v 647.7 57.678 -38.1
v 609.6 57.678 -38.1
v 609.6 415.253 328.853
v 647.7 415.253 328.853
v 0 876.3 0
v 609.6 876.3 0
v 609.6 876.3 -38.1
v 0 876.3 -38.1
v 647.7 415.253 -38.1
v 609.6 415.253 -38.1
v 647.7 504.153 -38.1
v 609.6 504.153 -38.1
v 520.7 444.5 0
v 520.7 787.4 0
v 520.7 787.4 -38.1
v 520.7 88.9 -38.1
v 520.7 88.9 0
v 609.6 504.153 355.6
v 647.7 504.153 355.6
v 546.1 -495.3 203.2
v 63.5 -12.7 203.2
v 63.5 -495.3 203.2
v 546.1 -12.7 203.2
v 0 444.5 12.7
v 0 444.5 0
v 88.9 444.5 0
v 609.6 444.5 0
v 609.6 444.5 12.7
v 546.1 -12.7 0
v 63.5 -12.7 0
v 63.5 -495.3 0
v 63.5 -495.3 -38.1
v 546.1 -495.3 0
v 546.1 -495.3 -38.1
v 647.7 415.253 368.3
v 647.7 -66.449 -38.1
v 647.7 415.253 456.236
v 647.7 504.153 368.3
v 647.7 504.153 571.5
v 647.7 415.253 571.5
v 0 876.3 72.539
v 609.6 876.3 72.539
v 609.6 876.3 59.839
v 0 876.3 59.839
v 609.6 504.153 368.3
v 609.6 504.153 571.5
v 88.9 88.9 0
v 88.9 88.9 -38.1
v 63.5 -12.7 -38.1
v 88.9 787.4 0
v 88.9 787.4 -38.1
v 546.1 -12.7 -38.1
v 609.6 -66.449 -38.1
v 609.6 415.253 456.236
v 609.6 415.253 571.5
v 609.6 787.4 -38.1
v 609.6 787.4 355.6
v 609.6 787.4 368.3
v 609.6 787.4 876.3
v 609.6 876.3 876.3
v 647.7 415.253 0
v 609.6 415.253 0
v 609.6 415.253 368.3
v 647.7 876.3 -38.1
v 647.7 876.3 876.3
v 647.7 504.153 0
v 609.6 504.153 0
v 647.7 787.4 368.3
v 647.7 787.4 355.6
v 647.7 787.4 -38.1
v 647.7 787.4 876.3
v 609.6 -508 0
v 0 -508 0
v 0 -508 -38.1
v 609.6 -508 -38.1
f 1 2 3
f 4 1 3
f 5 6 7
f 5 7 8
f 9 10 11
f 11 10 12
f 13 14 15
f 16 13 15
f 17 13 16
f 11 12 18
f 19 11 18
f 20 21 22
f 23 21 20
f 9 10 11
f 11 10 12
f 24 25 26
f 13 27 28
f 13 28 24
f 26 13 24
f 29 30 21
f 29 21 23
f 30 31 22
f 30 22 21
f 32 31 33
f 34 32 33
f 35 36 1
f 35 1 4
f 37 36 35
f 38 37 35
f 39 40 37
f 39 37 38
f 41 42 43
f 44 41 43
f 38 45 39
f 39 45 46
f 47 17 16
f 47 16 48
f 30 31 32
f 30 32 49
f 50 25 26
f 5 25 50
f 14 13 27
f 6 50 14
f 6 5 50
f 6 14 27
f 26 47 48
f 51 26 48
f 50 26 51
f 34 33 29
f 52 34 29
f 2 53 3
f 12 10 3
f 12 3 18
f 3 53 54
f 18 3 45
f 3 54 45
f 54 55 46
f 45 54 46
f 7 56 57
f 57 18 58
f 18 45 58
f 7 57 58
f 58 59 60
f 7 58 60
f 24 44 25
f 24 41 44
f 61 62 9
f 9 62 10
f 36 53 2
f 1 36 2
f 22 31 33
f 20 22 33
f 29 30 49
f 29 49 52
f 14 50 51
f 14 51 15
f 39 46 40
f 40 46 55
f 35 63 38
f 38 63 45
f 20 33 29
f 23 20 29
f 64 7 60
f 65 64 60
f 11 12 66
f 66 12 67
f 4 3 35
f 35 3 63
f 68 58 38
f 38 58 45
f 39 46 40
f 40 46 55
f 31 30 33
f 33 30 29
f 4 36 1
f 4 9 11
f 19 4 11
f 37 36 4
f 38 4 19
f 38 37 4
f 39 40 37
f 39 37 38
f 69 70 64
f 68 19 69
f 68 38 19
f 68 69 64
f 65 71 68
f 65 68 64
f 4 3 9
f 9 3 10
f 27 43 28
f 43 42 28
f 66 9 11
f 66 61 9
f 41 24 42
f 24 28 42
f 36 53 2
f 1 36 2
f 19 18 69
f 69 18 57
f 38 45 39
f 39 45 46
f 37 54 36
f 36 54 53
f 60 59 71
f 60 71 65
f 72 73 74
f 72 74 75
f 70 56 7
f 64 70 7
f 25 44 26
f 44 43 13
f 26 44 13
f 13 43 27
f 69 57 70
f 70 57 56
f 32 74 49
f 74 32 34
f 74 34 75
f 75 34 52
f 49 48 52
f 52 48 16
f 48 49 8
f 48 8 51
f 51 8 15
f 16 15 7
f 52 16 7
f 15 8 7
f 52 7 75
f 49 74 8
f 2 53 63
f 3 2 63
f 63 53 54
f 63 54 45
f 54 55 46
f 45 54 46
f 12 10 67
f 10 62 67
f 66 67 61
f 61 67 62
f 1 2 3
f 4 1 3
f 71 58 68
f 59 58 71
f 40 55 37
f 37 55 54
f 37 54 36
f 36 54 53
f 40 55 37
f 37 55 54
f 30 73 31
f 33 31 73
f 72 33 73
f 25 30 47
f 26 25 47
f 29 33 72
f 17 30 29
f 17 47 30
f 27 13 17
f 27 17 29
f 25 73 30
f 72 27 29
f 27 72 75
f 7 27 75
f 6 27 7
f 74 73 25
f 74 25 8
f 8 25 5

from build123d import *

# Parameters (mm, degrees)
F0_W      = 431.8
F0_H      = 88.9
F1_DEPTH  = 38.1
F3_DEPTH  = 431.8
F4_DEPTH  = 88.9
F5_DEPTH  = 88.9
F6_W      = 482.6
F6_H      = 482.6
F7_DEPTH  = 203.2
F6_W_2    = 609.6
F6_H_2    = 508
F8_DEPTH  = 38.1
F9_W      = 283.2469639567
F9_H      = 12.7
F9_W_2    = 88.9
F9_H_2    = 355.6
F9_H_3    = 508
F9_H_4    = 38.1
F10_DEPTH = 38.1
F11_DEPTH = 38.1


with BuildPart() as f1:
    # F0 (on Top) → F1 (new body)
    with BuildSketch(Plane.XY):
        Polygon((0, 88.9), (0, 0), (609.6, 0), (609.6, 88.9), (520.7, 88.9), (88.9, 88.9), align=None)
        Polygon((0, 876.3), (0, 88.9), (88.9, 88.9), (88.9, 444.5), (88.9, 787.4), (88.9, 876.3), align=None)
        Polygon((520.7, 88.9), (609.6, 88.9), (609.6, 876.3), (520.7, 876.3), (520.7, 787.4), (520.7, 444.5), align=None)
        with Locations((304.8, 831.85)):
            Rectangle(F0_W, F0_H)
    extrude(amount=-F1_DEPTH)



with BuildPart() as f3:
    # F2 (on face) → F3 (new body)
    with BuildSketch(Plane(origin=(520.7, 0, 0), x_dir=(0, -1, 0), z_dir=(-1, 0, 0))):
        Polygon((-876.3, 59.839021205), (-444.5, 0), (-444.5, 12.7), (-876.3, 72.539021205), align=None)
    extrude(amount=F3_DEPTH)


with BuildPart() as f1_1:
    add(f1.part)
    # F4 (add): a face of the model
    f4_faces = [f3.part.faces().sort_by_distance(p)[0] for p in [
        (520.7, 660.4, 36.2695106025),
    ]]

    add(f3.part)  # F4 merges F3
    extrude(f4_faces, amount=F4_DEPTH)

    # F5 (add): a face of the model
    f5_faces = [f1_1.faces().sort_by_distance(p)[0] for p in [
        (88.9, 660.4, 36.2695106025),
    ]]
    extrude(f5_faces, amount=F5_DEPTH)



with BuildPart() as f7:
    # F6 (on Top) → F7 (new body)
    with BuildSketch(Plane.XY):
        with Locations((304.8, -254)):
            Rectangle(F6_W, F6_H)
    extrude(amount=F7_DEPTH)


with BuildPart() as f1_2:
    add(f1_1.part)

    add(f7.part)  # F8 merges F7
    # F6 (on Top) → F8 (join)
    with BuildSketch(Plane.XY):
        with Locations((304.8, -254)):
            Rectangle(F6_W_2, F6_H_2)
        with Locations((304.8, -254)):
            Rectangle(F6_W, F6_H, mode=Mode.SUBTRACT)
    extrude(amount=-F8_DEPTH)


with BuildPart() as f10:
    # F9 (on face) → F10 (new body)
    with BuildSketch(Plane.YZ.offset(609.6)):
        with Locations((645.7765180217, 361.95)):
            Rectangle(F9_W, F9_H)
        with Locations((831.85, 177.8)):
            Rectangle(F9_W_2, F9_H_2)
        with Locations((831.85, 622.3)):
            Rectangle(F9_W_2, F9_H_3)
        with Locations((459.7030360433, 361.95)):
            Rectangle(F9_W_2, F9_H)
        Polygon((415.2530360433, -38.1), (504.1530360433, -38.1), (504.1530360433, 0), (444.5, 0), (415.2530360433, 0), align=None)
        Polygon((444.5, 0), (504.1530360433, 0), (504.1530360433, 355.6), (415.2530360433, 355.6), (415.2530360433, 328.8526361537), (415.2530360433, 0), align=None)
        Polygon((415.2530360433, 368.3), (504.1530360433, 368.3), (504.1530360433, 571.5), (415.2530360433, 571.5), (415.2530360433, 456.2355163903), align=None)
        with Locations((831.85, -19.05)):
            Rectangle(F9_W_2, F9_H_4)
        Polygon((415.2530360433, 328.8526361537), (415.2530360433, 355.6), (415.2530360433, 368.3), (415.2530360433, 456.2355163903), (-29.3229442363, 0), (94.804544347, 0), align=None)
        with Locations((831.85, 361.95)):
            Rectangle(F9_W_2, F9_H)
        Polygon((-66.4492622018, -38.1), (57.6782263815, -38.1), (94.804544347, 0), (-29.3229442363, 0), align=None)
    extrude(amount=F10_DEPTH)


with BuildPart() as f11:
    # F9 (on face) → F11 (new body)
    with BuildSketch(Plane.YZ.offset(609.6)):
        Polygon((415.2530360433, 328.8526361537), (415.2530360433, 355.6), (415.2530360433, 368.3), (415.2530360433, 456.2355163903), (-29.3229442363, 0), (94.804544347, 0), align=None)
        Polygon((-66.4492622018, -38.1), (57.6782263815, -38.1), (94.804544347, 0), (-29.3229442363, 0), align=None)
        Polygon((415.2530360433, 368.3), (504.1530360433, 368.3), (504.1530360433, 571.5), (415.2530360433, 571.5), (415.2530360433, 456.2355163903), align=None)
    extrude(amount=F11_DEPTH)


with BuildPart() as f11b:
    # F9 (on face) → F11, piece 2 (new body)
    with BuildSketch(Plane.YZ.offset(609.6)):
        Polygon((415.2530360433, -38.1), (504.1530360433, -38.1), (504.1530360433, 0), (444.5, 0), (415.2530360433, 0), align=None)
    extrude(amount=F11_DEPTH)


solid = Compound([f1_2.part, f10.part, f11.part, f11b.part])
